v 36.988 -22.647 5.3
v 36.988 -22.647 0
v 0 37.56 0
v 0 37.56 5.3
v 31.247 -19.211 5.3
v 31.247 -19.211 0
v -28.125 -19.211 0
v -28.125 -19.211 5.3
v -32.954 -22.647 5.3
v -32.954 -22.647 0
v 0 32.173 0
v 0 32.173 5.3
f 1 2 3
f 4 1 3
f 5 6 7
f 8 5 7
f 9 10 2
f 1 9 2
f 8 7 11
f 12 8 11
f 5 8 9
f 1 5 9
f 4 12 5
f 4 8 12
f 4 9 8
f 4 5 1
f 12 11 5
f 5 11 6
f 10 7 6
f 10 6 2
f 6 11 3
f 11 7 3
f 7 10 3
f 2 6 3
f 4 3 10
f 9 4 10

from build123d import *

# Parameters (mm, degrees)
F1_DEPTH = 5.3


with BuildPart() as f1:
    # F0 (on Top) → F1 (new body)
    with BuildSketch(Plane.XY):
        Polygon((36.987744, -22.647183), (0, 37.559837), (-32.954307, -22.647183), align=None)
        Polygon((31.247444, -19.210724), (0, -19.210724), (-28.124915, -19.210724), (0, 32.173071), align=None, mode=Mode.SUBTRACT)
    extrude(amount=F1_DEPTH)


solid = f1.part
